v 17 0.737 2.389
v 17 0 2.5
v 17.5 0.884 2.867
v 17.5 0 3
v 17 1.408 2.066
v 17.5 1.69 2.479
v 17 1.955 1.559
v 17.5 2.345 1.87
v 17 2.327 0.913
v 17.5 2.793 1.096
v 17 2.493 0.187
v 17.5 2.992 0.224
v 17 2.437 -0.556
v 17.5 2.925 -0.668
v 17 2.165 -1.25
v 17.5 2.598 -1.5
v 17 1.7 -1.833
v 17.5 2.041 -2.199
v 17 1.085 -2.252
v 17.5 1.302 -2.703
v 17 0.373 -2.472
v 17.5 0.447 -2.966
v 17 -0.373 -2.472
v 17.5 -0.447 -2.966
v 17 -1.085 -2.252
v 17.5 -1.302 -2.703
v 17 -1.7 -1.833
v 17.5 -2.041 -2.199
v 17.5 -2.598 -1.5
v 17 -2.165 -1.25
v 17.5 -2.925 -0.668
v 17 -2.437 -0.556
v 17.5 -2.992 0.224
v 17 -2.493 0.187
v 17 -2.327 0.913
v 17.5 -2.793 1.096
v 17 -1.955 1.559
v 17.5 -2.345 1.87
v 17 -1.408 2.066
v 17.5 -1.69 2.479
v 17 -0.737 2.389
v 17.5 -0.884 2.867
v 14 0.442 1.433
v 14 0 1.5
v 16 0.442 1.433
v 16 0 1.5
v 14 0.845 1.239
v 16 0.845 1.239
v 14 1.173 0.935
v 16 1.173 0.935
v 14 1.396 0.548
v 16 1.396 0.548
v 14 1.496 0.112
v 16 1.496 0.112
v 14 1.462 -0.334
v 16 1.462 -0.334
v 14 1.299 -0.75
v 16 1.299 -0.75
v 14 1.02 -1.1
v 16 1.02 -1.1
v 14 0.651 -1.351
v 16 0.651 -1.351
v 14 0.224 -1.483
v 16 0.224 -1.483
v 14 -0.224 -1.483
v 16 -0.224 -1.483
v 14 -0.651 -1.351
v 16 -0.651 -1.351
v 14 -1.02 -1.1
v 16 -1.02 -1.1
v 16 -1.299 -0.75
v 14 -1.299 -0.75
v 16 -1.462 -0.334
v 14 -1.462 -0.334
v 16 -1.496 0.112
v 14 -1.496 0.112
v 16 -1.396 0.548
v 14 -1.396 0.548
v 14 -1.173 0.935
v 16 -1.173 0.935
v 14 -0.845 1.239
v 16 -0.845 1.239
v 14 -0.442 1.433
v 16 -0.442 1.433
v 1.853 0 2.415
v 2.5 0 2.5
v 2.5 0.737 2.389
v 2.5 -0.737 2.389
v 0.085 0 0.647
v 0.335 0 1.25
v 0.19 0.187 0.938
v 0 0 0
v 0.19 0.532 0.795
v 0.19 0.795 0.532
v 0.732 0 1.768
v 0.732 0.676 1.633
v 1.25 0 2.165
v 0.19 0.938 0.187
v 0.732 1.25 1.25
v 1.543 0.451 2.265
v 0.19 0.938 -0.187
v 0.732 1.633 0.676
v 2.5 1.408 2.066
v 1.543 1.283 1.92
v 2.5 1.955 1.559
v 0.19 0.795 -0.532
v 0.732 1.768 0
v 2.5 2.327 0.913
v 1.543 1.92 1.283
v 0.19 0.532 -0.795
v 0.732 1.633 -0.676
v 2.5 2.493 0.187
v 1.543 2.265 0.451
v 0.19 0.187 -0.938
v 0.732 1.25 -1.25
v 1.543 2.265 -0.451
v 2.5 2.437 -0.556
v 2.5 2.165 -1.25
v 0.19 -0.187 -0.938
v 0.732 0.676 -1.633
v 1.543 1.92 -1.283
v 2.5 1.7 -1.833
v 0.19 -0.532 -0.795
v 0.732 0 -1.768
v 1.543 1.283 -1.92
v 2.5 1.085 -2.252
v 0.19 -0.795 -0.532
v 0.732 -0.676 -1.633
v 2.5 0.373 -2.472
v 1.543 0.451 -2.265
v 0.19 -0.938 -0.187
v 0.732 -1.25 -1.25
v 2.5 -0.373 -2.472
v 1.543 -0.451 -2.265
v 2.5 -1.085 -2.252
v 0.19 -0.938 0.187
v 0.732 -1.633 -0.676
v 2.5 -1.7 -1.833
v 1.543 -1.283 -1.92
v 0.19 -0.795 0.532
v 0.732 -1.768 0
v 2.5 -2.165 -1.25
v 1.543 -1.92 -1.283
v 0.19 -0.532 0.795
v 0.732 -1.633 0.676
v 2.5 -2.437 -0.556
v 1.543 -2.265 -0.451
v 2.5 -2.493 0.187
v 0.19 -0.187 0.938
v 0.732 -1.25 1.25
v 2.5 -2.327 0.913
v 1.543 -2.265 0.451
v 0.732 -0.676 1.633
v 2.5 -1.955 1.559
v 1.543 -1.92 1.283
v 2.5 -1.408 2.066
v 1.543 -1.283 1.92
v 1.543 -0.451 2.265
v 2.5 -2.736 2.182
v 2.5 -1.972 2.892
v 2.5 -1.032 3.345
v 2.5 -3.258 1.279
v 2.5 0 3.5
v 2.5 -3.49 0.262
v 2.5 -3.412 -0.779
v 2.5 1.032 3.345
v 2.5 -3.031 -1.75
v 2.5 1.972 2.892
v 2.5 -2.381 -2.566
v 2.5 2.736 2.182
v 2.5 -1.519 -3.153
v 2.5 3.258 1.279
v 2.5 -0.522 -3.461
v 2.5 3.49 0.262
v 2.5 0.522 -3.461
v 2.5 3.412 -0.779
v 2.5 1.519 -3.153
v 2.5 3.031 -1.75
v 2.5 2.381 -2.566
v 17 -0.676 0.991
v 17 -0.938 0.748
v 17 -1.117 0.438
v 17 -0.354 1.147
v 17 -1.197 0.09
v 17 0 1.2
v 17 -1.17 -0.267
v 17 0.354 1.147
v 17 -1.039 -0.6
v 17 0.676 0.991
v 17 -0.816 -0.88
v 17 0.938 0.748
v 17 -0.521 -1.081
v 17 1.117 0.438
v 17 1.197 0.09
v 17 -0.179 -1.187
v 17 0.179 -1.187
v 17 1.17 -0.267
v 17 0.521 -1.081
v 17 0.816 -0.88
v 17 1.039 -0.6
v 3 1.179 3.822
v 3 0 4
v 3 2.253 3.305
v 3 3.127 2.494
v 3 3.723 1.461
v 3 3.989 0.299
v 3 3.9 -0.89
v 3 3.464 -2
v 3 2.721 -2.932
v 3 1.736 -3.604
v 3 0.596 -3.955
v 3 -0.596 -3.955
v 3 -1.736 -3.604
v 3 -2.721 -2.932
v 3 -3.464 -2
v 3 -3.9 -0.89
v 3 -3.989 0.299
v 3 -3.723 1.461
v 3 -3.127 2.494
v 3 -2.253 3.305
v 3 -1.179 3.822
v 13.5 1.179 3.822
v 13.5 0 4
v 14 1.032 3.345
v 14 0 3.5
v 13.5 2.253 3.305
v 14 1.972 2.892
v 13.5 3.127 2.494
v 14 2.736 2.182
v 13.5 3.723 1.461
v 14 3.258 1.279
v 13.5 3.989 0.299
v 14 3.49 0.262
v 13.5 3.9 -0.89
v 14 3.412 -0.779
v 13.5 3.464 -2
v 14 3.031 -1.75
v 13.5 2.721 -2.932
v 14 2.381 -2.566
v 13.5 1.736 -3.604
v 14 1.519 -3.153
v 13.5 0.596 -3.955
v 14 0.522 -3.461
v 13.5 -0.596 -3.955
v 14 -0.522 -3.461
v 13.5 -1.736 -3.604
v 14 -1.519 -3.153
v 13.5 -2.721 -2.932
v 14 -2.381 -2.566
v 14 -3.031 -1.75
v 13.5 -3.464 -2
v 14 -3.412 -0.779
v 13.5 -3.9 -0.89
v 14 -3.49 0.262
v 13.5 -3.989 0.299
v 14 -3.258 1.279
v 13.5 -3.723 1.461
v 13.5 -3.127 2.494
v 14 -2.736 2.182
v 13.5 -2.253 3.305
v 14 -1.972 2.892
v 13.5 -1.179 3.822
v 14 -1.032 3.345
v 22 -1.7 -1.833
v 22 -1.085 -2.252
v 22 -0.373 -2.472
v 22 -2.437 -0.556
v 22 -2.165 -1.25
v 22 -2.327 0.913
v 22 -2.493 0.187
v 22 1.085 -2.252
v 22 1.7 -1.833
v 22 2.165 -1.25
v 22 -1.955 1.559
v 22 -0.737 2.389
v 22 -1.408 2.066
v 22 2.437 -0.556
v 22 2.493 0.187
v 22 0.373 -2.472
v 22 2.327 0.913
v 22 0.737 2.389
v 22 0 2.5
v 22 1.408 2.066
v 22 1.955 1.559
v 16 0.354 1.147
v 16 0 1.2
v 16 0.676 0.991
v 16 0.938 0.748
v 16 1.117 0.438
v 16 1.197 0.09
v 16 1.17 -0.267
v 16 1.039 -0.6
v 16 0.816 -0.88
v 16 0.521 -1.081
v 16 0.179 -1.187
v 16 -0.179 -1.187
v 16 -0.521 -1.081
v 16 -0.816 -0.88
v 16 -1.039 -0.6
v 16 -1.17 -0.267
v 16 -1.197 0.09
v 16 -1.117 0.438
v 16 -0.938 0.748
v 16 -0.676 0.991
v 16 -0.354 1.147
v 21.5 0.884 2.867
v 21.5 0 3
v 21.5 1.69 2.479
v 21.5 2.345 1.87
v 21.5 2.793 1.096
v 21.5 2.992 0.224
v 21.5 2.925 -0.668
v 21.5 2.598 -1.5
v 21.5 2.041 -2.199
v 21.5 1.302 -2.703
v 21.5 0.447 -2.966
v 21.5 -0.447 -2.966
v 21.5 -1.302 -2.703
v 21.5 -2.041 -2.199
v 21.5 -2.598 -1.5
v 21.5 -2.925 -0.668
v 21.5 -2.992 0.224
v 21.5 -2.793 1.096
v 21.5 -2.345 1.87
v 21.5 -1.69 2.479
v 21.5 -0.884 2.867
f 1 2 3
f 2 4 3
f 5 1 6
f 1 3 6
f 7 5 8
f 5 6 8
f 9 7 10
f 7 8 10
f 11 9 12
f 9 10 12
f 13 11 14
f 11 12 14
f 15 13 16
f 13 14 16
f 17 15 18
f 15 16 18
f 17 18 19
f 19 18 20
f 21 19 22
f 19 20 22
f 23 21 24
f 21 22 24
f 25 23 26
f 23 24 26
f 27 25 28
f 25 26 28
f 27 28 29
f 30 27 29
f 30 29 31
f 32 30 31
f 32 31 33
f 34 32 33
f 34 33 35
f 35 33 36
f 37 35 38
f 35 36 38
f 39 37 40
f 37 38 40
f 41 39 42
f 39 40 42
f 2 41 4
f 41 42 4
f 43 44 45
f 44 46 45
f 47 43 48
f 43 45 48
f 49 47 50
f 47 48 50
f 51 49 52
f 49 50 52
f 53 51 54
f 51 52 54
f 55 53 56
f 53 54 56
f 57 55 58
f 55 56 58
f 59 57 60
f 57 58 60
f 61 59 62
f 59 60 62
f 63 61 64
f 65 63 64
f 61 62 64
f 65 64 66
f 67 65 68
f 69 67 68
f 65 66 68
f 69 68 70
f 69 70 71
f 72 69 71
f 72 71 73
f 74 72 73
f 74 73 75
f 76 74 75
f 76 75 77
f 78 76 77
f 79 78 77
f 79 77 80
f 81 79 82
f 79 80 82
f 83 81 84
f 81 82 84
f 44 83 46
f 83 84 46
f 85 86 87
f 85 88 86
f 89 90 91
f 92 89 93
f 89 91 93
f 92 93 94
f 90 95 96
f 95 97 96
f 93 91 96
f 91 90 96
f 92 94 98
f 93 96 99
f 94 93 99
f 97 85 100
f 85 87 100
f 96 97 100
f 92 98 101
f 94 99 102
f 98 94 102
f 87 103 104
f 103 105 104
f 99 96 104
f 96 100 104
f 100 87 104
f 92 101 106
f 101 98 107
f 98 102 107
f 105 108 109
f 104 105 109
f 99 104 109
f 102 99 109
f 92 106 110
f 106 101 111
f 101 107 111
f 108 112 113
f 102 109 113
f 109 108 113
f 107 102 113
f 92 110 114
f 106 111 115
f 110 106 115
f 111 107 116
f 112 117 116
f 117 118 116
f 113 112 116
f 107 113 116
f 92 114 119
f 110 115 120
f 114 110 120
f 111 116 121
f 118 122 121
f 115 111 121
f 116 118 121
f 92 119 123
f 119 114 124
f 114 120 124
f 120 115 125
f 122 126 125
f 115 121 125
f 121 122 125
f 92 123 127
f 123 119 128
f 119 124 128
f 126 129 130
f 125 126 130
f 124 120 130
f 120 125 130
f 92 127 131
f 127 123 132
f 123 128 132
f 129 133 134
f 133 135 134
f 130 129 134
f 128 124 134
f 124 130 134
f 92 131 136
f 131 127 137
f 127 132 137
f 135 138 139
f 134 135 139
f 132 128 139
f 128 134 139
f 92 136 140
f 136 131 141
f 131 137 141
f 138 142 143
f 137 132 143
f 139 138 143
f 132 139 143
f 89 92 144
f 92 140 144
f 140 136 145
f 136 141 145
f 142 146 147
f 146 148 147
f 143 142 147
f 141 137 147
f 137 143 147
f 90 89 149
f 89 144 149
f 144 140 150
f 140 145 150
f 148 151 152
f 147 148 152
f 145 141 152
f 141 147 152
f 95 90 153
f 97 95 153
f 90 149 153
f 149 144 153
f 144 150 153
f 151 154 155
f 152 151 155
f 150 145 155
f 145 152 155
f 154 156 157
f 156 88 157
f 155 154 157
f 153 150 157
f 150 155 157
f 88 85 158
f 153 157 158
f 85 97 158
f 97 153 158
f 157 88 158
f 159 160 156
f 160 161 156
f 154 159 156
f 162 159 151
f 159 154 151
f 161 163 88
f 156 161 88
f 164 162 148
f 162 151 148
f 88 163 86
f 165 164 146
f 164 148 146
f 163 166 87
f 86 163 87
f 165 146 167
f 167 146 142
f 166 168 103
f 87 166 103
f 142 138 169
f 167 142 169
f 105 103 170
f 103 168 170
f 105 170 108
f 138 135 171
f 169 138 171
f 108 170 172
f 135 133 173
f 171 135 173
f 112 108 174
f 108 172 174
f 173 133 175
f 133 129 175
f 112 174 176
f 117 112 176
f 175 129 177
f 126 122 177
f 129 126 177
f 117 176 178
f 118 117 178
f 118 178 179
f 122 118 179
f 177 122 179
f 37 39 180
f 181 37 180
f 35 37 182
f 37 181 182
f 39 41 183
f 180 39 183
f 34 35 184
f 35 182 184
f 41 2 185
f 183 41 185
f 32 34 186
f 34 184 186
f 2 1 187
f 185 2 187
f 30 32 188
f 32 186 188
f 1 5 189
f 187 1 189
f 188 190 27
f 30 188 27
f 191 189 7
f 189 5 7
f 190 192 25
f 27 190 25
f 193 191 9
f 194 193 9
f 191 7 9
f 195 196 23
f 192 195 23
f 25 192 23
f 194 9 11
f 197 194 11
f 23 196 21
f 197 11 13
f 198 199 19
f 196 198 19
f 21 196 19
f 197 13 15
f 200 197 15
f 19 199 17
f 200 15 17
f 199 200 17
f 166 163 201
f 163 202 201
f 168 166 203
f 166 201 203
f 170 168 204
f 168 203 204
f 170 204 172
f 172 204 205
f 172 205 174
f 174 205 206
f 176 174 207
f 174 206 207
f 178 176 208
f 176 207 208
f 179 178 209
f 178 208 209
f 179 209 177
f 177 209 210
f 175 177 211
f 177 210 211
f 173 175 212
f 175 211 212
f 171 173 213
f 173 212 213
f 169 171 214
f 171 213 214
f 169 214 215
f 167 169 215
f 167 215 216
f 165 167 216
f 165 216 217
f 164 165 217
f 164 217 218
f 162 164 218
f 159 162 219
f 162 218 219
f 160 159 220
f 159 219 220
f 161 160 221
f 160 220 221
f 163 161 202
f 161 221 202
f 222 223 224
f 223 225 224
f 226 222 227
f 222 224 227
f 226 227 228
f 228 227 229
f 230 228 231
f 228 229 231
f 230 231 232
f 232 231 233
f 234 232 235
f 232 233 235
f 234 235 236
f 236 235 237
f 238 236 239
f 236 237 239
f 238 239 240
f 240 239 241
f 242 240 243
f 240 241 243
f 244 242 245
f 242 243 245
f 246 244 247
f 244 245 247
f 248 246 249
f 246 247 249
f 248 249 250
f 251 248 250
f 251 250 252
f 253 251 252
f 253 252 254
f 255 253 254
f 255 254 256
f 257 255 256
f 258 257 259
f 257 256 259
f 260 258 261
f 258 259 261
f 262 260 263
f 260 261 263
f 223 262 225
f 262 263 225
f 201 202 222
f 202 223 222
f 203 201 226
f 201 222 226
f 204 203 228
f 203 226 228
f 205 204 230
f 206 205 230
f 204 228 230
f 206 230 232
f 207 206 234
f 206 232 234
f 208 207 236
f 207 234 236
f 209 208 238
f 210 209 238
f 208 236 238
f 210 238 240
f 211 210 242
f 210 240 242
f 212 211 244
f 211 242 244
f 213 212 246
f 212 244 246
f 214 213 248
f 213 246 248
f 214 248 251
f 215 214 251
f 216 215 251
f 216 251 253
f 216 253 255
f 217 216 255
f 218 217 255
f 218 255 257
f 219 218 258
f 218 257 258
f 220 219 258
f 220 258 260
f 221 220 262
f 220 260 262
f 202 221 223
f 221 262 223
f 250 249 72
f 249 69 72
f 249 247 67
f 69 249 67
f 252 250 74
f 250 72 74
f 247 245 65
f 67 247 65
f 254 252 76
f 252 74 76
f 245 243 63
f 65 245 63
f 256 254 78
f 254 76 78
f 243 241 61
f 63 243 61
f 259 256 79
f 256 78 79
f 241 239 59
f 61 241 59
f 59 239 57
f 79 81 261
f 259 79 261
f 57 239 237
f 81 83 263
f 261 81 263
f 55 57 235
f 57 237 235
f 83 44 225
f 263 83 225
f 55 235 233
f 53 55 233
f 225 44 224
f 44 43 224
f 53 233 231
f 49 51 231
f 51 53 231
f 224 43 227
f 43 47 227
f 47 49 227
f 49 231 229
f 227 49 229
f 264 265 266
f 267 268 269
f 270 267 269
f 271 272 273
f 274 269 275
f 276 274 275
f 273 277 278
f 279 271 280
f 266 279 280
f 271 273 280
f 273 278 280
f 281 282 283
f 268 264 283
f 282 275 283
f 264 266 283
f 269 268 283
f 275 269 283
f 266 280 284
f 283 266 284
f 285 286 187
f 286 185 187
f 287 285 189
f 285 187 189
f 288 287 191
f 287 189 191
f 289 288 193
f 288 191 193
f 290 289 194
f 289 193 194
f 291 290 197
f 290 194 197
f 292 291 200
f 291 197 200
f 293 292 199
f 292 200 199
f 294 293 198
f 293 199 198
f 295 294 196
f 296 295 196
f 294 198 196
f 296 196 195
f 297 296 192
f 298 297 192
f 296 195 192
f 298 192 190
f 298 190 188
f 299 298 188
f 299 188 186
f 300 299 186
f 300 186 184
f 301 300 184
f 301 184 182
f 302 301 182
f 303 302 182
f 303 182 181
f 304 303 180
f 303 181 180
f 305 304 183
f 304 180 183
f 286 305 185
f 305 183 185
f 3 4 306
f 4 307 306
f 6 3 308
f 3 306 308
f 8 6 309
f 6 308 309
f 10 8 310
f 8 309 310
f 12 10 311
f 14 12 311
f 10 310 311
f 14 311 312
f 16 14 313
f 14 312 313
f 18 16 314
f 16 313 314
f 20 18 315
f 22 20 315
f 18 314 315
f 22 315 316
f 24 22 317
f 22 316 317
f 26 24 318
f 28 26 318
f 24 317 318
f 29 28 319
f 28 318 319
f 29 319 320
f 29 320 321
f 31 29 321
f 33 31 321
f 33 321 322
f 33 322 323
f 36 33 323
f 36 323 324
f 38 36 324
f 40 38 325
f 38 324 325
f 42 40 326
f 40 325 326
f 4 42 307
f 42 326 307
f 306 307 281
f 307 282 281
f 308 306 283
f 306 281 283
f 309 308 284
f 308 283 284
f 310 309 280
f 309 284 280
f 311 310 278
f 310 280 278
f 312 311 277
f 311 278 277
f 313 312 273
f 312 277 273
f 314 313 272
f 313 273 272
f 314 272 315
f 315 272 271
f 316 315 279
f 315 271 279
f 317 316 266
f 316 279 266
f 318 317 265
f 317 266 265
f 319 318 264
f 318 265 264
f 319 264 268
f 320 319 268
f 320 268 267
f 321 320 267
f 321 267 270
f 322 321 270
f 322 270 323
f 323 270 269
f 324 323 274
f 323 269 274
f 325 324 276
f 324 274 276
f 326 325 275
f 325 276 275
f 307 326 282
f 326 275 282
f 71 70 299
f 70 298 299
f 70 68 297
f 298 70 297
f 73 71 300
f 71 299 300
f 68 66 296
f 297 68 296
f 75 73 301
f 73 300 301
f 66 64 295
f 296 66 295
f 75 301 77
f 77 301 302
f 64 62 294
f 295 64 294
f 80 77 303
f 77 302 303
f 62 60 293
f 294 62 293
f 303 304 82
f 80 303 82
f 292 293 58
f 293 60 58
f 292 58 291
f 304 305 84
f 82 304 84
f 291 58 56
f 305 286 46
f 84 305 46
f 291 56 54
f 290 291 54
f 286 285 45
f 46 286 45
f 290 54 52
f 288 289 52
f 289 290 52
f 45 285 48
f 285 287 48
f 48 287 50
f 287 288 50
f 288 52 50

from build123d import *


with BuildPart() as part:
    # 草图1 → 旋转1 (revolve)
    with BuildSketch(Plane.XY):
        with BuildLine():
            Line((2.5, 2.5), (2.5, 3.5))
            Line((2.5, 3.5), (3, 4))
            Line((3, 4), (13.5, 4))
            Line((13.5, 4), (14, 3.5))
            Line((14, 3.5), (14, 1.5))
            Line((14, 1.5), (16, 1.5))
            Line((16, 1.5), (16, 1.2))
            Line((16, 1.2), (17, 1.2))
            Line((17, 1.2), (17, 2.5))
            Line((17, 2.5), (17.5, 3))
            Line((17.5, 3), (21.5, 3))
            Line((21.5, 3), (22, 2.5))
            Line((22, 2.5), (22, 0))
            Line((22, 0), (0, 0))
            ThreePointArc((0, 0), (0.732233047, 1.767766953), (2.5, 2.5))
        make_face()
    revolve(axis=Axis((22, 0, 0), (-1, 0, 0)))


solid = part.part
